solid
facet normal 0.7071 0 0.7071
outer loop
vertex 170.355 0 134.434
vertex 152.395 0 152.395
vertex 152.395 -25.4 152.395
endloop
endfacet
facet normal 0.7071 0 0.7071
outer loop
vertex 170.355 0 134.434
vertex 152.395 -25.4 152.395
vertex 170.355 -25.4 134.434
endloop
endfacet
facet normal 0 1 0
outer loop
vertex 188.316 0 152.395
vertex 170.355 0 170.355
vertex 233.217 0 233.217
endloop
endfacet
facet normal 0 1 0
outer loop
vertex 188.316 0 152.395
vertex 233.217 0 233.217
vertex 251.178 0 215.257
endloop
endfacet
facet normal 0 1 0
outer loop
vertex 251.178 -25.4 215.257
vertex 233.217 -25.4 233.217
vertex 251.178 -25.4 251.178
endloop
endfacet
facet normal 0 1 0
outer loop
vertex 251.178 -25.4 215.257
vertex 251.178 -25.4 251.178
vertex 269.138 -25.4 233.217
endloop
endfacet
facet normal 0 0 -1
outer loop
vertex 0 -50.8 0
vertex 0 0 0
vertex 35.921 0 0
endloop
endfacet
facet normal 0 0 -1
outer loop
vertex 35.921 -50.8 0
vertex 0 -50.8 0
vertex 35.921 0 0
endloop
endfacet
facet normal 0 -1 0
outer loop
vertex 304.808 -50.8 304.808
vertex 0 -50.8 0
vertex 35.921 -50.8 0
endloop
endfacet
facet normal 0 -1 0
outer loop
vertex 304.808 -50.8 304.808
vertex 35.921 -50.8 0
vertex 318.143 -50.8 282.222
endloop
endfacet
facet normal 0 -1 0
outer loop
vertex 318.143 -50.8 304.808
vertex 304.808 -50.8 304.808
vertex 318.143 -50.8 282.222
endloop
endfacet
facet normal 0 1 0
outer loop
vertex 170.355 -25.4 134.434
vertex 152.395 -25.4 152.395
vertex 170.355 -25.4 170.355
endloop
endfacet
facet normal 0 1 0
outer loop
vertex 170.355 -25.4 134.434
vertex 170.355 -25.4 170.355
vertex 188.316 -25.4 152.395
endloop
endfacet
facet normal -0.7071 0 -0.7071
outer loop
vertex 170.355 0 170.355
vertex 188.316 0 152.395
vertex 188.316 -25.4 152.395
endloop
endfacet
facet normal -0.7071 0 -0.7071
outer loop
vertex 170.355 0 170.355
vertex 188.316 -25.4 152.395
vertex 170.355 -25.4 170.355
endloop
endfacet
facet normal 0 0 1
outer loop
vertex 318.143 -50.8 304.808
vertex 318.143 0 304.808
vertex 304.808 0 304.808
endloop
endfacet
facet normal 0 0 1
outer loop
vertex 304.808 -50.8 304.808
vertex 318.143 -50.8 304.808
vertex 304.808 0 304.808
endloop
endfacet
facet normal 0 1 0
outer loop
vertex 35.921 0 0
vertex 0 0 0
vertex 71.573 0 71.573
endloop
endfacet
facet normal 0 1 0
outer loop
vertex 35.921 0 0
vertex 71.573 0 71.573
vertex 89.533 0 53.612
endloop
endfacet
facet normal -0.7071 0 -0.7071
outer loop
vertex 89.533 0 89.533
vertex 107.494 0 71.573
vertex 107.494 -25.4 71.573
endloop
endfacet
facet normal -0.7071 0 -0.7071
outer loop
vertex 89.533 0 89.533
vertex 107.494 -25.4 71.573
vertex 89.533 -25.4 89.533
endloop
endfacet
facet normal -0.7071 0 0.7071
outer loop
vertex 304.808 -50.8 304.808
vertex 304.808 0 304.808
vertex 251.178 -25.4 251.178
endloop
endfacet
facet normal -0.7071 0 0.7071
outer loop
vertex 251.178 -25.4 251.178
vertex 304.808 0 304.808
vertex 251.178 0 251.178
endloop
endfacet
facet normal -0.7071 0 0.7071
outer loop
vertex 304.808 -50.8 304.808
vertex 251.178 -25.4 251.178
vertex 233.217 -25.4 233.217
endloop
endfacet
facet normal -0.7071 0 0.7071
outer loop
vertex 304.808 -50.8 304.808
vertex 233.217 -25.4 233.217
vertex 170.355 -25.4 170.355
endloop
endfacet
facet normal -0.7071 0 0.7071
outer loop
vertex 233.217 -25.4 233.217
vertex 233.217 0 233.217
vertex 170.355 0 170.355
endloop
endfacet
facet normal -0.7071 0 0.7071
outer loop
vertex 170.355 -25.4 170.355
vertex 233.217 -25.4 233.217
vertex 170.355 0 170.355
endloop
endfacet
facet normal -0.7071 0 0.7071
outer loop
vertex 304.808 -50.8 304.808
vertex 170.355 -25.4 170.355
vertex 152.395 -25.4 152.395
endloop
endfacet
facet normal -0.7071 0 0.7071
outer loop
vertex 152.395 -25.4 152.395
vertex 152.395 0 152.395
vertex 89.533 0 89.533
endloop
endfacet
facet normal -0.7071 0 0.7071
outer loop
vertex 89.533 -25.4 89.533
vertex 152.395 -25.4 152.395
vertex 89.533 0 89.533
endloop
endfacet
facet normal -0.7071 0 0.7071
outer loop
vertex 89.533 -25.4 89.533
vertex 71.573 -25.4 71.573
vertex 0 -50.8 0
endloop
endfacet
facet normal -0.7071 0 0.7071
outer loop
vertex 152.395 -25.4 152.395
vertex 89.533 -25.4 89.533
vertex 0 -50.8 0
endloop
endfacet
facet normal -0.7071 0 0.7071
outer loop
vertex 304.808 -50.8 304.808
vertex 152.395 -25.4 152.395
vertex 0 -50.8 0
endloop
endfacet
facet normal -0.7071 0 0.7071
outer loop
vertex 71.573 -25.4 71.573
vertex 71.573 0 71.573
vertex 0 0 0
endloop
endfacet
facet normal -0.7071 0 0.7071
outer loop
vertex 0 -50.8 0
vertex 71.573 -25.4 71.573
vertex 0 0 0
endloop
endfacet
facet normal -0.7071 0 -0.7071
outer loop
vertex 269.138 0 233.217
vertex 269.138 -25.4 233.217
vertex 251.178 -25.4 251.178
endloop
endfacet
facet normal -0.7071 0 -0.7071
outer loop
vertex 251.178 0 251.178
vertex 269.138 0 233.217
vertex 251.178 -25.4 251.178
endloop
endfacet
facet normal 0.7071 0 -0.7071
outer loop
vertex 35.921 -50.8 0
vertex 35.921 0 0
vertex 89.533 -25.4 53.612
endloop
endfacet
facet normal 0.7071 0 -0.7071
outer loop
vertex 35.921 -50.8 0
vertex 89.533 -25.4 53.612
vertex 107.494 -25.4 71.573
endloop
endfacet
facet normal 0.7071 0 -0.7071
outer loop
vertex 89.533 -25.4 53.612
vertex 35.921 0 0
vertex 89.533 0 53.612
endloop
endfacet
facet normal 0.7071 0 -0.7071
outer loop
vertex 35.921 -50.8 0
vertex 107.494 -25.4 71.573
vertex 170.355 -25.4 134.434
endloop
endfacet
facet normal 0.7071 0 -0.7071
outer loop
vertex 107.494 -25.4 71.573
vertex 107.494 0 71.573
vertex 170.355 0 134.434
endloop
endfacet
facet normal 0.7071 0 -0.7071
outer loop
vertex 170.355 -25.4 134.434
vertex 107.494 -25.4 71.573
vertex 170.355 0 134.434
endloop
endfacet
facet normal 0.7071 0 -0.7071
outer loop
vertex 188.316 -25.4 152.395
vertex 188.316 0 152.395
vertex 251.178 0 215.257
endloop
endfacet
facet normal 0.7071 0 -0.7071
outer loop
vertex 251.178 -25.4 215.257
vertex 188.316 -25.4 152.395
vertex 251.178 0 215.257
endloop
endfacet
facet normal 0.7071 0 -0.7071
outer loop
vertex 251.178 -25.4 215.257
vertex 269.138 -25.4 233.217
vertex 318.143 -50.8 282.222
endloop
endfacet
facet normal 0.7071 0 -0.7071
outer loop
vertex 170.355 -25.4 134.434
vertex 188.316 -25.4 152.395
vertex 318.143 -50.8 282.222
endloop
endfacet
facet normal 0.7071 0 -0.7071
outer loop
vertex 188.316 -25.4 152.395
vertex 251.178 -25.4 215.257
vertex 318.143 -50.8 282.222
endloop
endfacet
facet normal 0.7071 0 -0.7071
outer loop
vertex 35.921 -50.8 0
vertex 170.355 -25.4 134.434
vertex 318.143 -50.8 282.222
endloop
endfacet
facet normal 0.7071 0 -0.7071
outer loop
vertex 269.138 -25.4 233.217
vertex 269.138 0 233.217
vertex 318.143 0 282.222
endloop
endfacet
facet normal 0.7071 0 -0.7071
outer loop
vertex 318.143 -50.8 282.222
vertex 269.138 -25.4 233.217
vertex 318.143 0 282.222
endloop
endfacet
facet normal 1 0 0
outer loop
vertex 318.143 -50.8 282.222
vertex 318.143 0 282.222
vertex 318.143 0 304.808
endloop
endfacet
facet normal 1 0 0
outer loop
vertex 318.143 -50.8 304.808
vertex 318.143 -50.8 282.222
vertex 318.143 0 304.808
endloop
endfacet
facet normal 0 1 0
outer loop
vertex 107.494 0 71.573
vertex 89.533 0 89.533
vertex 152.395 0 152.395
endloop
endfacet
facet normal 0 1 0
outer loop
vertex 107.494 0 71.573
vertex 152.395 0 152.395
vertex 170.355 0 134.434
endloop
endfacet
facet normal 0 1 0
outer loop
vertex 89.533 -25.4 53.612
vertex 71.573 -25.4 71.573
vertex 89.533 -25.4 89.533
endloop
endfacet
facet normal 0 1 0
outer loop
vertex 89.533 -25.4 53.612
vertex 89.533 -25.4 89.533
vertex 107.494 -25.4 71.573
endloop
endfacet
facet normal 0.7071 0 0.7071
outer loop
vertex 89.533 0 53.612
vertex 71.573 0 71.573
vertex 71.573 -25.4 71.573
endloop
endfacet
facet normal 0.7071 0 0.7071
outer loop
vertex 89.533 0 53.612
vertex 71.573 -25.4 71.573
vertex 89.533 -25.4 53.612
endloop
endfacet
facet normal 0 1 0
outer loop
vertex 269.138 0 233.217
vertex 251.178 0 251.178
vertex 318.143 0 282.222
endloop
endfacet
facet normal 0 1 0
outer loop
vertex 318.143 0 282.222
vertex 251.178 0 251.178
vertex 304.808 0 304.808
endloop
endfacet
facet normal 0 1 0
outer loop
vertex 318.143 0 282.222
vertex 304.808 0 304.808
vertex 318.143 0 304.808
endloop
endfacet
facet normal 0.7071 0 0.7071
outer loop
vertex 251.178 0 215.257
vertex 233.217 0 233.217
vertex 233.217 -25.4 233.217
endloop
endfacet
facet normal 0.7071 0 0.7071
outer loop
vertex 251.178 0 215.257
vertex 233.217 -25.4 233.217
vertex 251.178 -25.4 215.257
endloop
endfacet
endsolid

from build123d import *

# Parameters (mm, degrees)
F1_DEPTH = 50.8
F3_DEPTH = 25.4


with BuildPart() as f1:
    # F0 (on Front) → F1 (new body)
    with BuildSketch(Plane.XZ):
        Polygon((304.807853, 304.807853), (0, 0), (35.921024, 0), (318.142853, 282.221829), (318.142853, 304.807853), align=None)
    extrude(amount=F1_DEPTH)

    # F2 (on Front) → F3 (cut)
    with BuildSketch(Plane.XZ):
        Polygon((235.138051, 267.217477), (217.177538, 249.256964), (266.149292, 200.285211), (284.109804, 218.245724), align=None)
        Polygon((77.603452, 101.462855), (59.64294, 83.502342), (106.885168, 36.260115), (124.84568, 54.220627), align=None)
        Polygon((151.667562, 189.043356), (133.707049, 171.082843), (190.513352, 114.27654), (208.473865, 132.237053), align=None)
    extrude(amount=F3_DEPTH, mode=Mode.SUBTRACT)


solid = f1.part
